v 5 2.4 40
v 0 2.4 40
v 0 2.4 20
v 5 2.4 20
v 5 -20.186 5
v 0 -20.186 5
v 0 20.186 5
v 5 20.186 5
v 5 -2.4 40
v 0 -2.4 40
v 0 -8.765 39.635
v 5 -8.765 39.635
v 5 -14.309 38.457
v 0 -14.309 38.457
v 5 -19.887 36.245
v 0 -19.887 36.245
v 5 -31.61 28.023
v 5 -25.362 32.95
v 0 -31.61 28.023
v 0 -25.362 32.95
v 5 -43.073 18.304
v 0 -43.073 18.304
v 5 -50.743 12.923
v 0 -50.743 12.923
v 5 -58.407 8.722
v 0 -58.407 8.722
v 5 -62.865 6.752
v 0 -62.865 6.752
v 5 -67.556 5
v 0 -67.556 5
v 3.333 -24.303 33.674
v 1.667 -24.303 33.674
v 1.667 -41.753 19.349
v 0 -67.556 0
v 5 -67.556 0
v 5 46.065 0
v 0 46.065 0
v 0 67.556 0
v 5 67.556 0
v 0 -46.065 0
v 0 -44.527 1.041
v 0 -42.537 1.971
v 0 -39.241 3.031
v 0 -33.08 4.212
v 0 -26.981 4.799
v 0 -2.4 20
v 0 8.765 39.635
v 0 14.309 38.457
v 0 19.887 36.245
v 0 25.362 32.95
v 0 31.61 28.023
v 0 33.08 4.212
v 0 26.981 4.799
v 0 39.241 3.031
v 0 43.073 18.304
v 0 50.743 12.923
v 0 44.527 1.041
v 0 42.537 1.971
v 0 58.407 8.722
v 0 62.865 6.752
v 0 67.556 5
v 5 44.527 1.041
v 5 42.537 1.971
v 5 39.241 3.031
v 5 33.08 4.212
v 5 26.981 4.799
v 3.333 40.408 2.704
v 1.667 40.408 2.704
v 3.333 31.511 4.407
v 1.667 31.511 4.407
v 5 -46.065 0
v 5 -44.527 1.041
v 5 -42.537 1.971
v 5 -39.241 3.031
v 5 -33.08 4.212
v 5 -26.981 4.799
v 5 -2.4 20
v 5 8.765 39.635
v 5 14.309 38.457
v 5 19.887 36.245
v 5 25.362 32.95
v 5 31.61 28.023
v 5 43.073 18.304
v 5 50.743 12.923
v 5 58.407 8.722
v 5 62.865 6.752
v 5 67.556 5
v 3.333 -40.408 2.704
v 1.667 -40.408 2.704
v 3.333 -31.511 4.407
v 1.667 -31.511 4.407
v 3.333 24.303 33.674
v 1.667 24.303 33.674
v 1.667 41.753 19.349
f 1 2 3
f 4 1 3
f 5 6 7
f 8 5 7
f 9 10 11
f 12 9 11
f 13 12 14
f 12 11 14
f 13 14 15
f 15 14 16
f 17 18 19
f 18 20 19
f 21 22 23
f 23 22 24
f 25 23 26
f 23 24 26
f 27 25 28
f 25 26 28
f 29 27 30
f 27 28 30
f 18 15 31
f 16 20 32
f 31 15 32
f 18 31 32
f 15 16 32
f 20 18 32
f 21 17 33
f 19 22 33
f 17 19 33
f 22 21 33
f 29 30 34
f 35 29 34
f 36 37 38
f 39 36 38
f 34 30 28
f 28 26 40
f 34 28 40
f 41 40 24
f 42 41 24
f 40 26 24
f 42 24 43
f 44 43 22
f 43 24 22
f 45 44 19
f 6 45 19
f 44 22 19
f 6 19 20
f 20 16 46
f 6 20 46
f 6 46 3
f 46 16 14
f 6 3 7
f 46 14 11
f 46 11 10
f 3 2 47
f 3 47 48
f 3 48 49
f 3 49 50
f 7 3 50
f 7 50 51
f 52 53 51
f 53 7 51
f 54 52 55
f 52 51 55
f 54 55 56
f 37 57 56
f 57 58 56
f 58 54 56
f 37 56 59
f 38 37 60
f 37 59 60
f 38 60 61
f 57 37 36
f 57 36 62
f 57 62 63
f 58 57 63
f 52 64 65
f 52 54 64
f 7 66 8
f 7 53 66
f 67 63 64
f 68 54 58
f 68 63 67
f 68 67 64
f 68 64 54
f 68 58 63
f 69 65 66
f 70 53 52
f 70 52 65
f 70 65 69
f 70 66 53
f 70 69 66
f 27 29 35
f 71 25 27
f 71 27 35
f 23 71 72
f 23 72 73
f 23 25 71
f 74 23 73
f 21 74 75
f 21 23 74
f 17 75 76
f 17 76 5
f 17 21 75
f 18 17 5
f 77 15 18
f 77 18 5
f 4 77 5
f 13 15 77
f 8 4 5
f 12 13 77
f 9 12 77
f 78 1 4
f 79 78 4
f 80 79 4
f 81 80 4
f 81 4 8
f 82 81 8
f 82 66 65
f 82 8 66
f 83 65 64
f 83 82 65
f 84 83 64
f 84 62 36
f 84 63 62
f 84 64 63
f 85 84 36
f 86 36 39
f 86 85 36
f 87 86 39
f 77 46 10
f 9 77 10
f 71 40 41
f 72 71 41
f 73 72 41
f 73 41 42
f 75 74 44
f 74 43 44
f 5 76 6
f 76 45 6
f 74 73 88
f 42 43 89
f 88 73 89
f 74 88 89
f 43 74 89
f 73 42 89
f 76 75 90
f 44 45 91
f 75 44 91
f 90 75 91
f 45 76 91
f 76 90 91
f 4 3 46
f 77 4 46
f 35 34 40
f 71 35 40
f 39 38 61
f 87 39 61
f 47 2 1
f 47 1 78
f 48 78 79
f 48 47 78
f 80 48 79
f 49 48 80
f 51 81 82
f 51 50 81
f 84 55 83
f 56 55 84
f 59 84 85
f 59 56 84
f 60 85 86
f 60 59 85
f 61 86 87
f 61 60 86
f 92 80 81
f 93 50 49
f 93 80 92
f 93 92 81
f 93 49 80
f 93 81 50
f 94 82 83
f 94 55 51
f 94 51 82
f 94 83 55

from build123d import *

# Parameters (mm, degrees)
F0_W     = 2.4
F0_H     = 15
F1_DEPTH = 5


with BuildPart() as f1:
    # F0 (on Right) → F1 (new body)
    with BuildSketch(Plane.YZ):
        with BuildLine():
            Line((2.4, 20), (2.4, 5))
            Line((2.4, 5), (20.186463, 5))
            add(Edge.make_bspline(
                [(46.06498, 0), (42.300154, 3.166663), (32.452856, 5), (20.186463, 5)],
                knots=[0, 0, 0, 0, 26.357117, 26.357117, 26.357117, 26.357117], degree=3))
            Line((46.06498, 0), (67.555659, 0))
            Line((67.555659, 0), (67.555659, 5))
            add(Edge.make_bspline(
                [(2.4, 40), (30.796705, 40.330239), (33.309266, 16.703796), (67.555659, 5)],
                knots=[0, 0, 0, 0, 73.961205, 73.961205, 73.961205, 73.961205], degree=3))
            Line((2.4, 40), (2.4, 20))
        make_face()
        with Locations((1.2, 12.5)):
            Rectangle(F0_W, F0_H)
        with Locations((-1.2, 12.5)):
            Rectangle(F0_W, F0_H)
        with BuildLine():
            Line((-20.186463, 5), (-2.4, 5))
            Line((-2.4, 5), (-2.4, 20))
            Line((-2.4, 20), (-2.4, 40))
            add(Edge.make_bspline(
                [(-2.4, 40), (-30.796705, 40.330239), (-33.309266, 16.703796), (-67.555659, 5)],
                knots=[0, 0, 0, 0, 73.961205, 73.961205, 73.961205, 73.961205], degree=3))
            Line((-67.555659, 5), (-67.555659, 0))
            Line((-67.555659, 0), (-46.06498, 0))
            add(Edge.make_bspline(
                [(-46.06498, 0), (-42.300154, 3.166663), (-32.452856, 5), (-20.186463, 5)],
                knots=[0, 0, 0, 0, 26.357117, 26.357117, 26.357117, 26.357117], degree=3))
        make_face()
    extrude(amount=F1_DEPTH)


solid = f1.part
